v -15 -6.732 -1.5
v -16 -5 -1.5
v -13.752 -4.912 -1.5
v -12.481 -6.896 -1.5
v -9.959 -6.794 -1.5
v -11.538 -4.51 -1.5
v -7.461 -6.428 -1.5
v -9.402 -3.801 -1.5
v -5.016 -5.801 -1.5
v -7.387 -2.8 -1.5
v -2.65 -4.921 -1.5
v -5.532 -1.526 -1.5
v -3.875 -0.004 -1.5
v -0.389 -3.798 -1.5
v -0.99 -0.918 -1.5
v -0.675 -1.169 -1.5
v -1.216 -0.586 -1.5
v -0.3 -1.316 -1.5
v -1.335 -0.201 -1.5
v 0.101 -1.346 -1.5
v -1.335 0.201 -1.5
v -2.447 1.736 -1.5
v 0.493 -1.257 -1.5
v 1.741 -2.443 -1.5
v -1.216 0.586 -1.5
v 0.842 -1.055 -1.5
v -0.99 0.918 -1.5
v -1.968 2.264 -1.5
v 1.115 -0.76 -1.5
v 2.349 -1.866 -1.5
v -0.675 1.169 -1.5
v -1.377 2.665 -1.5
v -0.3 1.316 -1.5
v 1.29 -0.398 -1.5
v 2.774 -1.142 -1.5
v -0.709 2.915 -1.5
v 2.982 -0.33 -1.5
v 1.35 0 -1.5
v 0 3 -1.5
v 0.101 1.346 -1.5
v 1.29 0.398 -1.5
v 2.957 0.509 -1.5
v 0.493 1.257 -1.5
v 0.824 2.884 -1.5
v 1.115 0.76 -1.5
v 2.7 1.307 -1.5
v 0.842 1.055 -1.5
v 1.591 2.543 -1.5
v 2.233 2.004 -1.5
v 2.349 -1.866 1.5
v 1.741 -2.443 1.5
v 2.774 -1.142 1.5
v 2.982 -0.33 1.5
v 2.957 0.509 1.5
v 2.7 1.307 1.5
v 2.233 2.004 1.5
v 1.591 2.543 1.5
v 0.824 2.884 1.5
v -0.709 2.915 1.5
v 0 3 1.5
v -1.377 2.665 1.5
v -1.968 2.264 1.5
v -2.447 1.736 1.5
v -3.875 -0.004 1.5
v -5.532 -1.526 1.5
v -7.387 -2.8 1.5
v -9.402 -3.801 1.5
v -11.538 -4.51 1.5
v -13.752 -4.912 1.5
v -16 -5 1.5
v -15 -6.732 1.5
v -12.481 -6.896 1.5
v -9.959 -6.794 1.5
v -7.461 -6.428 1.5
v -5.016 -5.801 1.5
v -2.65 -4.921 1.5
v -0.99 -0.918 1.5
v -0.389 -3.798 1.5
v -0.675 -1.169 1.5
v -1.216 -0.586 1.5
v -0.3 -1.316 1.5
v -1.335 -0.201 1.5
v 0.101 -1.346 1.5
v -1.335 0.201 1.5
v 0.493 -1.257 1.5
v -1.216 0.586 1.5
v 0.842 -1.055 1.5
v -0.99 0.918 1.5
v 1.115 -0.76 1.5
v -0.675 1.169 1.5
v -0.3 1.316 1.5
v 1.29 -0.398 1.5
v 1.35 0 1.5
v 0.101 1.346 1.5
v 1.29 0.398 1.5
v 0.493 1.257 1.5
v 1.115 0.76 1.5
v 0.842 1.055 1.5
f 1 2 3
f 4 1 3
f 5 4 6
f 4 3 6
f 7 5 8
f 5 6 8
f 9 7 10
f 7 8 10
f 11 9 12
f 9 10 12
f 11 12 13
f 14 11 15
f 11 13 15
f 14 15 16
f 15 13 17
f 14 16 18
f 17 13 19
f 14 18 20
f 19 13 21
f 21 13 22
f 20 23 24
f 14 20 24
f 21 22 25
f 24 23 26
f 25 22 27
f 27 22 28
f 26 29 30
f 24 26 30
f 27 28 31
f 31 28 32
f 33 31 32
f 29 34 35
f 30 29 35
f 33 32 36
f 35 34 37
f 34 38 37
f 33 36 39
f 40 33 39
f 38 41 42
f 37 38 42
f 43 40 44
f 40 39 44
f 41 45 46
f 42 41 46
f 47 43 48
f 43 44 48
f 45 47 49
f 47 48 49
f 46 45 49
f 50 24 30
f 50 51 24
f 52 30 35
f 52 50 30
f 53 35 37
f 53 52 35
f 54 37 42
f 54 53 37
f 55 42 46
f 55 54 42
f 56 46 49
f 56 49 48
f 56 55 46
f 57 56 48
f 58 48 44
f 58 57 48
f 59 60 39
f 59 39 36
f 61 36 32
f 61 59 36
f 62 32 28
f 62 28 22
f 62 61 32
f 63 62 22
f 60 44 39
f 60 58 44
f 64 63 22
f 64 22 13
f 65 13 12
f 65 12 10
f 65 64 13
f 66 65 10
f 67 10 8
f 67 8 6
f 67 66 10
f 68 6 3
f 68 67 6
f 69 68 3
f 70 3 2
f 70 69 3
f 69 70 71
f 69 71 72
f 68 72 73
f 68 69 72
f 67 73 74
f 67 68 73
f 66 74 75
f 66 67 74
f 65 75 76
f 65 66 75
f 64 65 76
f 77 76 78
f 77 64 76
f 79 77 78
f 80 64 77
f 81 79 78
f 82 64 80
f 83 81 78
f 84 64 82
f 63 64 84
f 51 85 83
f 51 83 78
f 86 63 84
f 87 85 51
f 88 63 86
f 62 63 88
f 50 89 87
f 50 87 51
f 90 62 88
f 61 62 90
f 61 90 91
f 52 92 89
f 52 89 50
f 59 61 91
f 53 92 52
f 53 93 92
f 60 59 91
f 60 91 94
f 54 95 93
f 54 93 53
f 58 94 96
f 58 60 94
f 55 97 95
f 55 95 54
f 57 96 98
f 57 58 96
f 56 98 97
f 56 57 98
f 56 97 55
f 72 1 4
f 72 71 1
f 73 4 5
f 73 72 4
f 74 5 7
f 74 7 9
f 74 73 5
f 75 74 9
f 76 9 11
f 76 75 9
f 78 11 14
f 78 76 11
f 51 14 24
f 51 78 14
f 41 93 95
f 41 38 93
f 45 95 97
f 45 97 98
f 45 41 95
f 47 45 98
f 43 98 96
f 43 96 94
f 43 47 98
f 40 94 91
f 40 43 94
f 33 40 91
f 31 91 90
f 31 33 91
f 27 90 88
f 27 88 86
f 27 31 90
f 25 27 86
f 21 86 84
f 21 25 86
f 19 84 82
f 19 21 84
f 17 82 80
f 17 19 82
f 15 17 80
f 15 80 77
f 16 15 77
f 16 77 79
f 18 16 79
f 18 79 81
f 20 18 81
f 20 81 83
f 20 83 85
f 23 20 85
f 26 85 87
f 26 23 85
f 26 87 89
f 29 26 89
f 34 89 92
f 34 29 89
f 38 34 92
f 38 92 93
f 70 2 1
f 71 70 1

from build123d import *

# Parameters (mm, degrees)
SKETCH1_R  = 1.35
PAWL_DEPTH = 1.5


with BuildPart() as part:
    # Sketch1 → Pawl (new, symmetric)
    with BuildSketch(Plane.XY):
        with BuildLine():
            Line((0.824491602, 2.884478046), (0, 3))
            ThreePointArc((0, 3), (-1.377173166, 2.665219329), (-2.446979028, 1.735596047))
            ThreePointArc((-2.446979028, 1.735596047), (-8.376740645, -3.335986631), (-16, -5))
            Line((-16, -5), (-15, -6.732050808))
            ThreePointArc((-15, -6.732050808), (-6.23012531, -6.146721639), (1.740902704, -2.443206454))
            ThreePointArc((1.740902704, -2.443206454), (2.956580376, 0.508559221), (0.824491602, 2.884478046))
        make_face()
        Circle(SKETCH1_R, mode=Mode.SUBTRACT)
    extrude(amount=PAWL_DEPTH, both=True)


solid = part.part
